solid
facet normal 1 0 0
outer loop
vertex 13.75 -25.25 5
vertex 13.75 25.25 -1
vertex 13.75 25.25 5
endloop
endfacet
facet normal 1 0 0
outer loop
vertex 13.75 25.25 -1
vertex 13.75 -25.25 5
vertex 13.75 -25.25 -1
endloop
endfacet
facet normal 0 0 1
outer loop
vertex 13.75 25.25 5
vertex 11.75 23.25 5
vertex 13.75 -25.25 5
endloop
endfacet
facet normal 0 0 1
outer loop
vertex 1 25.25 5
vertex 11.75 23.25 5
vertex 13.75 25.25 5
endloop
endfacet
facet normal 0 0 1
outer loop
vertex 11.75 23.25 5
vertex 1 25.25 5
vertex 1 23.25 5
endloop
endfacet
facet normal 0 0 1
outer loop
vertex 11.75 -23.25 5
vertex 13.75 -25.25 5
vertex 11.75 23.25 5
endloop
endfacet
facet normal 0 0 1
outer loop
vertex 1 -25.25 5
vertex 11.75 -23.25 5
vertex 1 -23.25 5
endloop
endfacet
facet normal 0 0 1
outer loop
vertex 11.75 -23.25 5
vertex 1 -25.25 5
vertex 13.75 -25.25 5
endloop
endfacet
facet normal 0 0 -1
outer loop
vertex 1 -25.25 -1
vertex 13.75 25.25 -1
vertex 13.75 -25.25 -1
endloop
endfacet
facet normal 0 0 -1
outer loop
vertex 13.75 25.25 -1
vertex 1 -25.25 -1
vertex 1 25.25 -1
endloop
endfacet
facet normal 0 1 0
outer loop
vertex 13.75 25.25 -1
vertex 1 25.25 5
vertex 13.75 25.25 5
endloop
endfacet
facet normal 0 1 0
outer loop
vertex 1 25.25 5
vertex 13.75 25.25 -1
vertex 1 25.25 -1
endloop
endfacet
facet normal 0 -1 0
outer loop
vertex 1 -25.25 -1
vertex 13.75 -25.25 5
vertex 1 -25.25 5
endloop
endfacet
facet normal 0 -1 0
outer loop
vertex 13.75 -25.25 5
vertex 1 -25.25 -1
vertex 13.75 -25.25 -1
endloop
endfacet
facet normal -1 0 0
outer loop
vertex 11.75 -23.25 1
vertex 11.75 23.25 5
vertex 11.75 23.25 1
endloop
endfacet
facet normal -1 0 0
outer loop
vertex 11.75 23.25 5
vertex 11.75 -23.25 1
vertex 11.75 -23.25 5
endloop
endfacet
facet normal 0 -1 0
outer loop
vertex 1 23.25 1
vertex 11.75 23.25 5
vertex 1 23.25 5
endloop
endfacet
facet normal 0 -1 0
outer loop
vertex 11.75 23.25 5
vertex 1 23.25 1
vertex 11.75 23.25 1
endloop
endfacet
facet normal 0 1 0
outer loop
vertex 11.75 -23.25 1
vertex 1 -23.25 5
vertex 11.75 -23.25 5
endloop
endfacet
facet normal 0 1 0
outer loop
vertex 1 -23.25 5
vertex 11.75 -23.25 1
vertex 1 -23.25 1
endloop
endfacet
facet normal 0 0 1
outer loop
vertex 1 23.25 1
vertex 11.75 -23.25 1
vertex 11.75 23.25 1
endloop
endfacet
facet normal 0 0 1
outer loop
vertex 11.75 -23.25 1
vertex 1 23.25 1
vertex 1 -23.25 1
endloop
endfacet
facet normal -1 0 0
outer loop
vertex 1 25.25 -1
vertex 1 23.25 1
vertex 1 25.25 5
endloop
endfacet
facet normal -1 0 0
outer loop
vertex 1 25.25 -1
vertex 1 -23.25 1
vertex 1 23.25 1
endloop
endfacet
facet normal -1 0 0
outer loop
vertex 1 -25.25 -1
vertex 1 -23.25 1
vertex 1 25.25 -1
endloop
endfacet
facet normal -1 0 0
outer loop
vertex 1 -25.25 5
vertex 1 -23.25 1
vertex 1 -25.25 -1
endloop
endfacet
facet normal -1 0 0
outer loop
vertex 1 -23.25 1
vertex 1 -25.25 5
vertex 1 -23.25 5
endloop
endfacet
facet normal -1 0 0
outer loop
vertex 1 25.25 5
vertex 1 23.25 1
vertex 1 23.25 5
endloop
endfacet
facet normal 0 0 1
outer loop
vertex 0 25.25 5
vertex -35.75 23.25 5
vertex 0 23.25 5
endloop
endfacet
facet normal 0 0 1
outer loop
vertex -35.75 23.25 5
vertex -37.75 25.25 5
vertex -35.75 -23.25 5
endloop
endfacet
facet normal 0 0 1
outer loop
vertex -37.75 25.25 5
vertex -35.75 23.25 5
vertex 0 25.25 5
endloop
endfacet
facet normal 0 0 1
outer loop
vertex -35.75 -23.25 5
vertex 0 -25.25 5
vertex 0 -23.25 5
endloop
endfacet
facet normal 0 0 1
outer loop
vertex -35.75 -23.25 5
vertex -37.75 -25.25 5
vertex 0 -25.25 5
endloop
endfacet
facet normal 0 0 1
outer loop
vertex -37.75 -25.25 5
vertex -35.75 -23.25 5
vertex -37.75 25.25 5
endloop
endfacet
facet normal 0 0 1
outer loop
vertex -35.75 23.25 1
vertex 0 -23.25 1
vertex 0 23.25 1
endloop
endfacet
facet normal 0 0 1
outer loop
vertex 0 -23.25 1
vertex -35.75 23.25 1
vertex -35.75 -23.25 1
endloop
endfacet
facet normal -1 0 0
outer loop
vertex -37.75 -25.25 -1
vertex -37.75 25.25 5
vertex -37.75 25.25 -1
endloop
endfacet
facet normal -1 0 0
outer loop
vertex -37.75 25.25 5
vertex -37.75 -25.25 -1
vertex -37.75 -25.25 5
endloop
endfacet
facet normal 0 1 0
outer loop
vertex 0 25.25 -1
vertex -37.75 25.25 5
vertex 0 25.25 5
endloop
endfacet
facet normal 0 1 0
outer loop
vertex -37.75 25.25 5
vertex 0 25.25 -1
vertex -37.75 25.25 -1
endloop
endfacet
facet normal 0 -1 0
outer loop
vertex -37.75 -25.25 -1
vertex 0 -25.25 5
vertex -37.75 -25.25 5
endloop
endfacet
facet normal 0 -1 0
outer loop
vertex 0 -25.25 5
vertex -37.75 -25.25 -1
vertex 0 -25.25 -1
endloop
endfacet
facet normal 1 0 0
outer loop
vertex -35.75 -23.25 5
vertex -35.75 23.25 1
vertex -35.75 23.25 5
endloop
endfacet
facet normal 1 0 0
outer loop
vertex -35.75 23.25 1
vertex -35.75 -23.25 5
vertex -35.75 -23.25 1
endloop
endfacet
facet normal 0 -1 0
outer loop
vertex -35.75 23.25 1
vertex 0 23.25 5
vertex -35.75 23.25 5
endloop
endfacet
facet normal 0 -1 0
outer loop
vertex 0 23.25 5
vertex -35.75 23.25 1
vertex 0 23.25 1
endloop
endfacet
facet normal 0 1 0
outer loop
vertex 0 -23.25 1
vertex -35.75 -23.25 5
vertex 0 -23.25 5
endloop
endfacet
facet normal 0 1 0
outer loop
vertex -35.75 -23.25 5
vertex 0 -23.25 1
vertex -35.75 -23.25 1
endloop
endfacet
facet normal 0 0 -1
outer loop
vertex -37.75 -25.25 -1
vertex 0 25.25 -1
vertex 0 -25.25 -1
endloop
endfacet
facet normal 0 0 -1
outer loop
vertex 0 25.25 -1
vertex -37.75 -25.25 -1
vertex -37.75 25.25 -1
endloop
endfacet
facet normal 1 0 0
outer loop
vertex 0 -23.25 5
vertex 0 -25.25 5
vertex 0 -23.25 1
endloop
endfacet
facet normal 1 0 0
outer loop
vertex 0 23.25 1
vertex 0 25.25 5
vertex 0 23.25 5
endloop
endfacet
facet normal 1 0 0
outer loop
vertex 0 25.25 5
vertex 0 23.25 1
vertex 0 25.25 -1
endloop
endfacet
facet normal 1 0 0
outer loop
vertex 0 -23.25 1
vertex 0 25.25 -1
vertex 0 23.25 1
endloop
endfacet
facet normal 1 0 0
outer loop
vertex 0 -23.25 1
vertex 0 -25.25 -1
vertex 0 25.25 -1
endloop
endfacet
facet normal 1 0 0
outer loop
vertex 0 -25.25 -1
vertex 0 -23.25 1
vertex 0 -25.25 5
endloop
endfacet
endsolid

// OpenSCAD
// file: controller.scad
w_back = 70;
h_back = 45;
w_controller = 20;
thickness_bottom = 2;

h_walls = 4;
thickness_walls = 2;

gap_backlight = 1.5;


//controller();
//walls();

debug_controller();

module debug_controller() {
    difference() {
        kit_controller();
        translate([-w_controller / 2, 0, h_walls / 2])
        cube([w_controller, h_back + 2 * thickness_walls + 1 + gap_backlight, 2 * h_walls], center=true);
    }
}

module kit_controller() {
    controller();
    translate([0, 0, h_walls/2])
    walls();
}
module walls() {
    difference() {   
        cube([w_controller + 2 * thickness_walls + gap_backlight, h_back + 2 * thickness_walls + gap_backlight, thickness_bottom + h_walls], center=true);

        color("red")
        cube([w_controller + gap_backlight, h_back + gap_backlight, thickness_bottom + h_walls+1], center=true);
    }
}
module controller() {
    cube([w_controller+gap_backlight, h_back+gap_backlight, thickness_bottom], center=true);
}
// main file
use <controller.scad>

echo("Работа Воробьева Савелия");

d_akkum = 18;
h_akkum = 65;
d_wires = 1.2;

thickness_frame = 4;
thickness_walls = 2;
thickness_bottom = 2;
thickness_top = 2;
width_frame_windows = 3;

w_back =70;
h_back = 45;
thickness_back = 1;
h_walls = 4;
gap_backlight = 1.5;

w_controller = 20;

//kit_frame();
//translate([w_back/2 + w_controller/2 + 2 * thickness_walls, 0, 0])
//kit_controller();
translate([1, 0, 0])
debug_controller();
frame_debug();
//translate([0, 0, thickness_bottom/2 + thickness_top/2])
//window_frame();

module window_frame() { 
    difference() {
       color("green")
        cube([w_back, h_back, thickness_top], center=true);
        color("red")
        cube([w_back-2*width_frame_windows, h_back-2*width_frame_windows, thickness_top + 1], center=true);
    }
}
module frame_debug() {
    difference() {
        kit_frame();
        translate([w_back/2, 0, h_walls-thickness_bottom])
        cube([w_back, h_back+2*thickness_walls+2, 2*h_walls], center=true);
    }
}
module kit_frame() {
    bottom();
    // color("green")
    translate([0, 0, h_walls/2+thickness_bottom/2])
    walls();
    wires();
    window_frame();
}

module wires() {
    translate([w_back/2, -h_back/2+2, h_walls/2+0.5])
    rotate([0, 90, 0])
    color("red")
    cylinder(d=d_wires, h=25, center=true, $fn=32);

    translate([w_back/2, -h_back/2+6, h_walls/2+0.5])
    rotate([0, 90, 0])
    color("black")
    cylinder(d=d_wires, h=25, center=true, $fn=32);
}


module walls() {
    difference() {
        cube([w_back+2*thickness_walls+gap_backlight, h_back+2*thickness_walls+gap_backlight, h_walls], center=true);
        color("red")
        cube([w_back+gap_backlight, h_back+gap_backlight, h_walls+1], center=true);
    }
}

module bottom() {
    cube([w_back+2*thickness_walls+gap_backlight, h_back+2*thickness_walls+gap_backlight, thickness_bottom], center=true);
}
